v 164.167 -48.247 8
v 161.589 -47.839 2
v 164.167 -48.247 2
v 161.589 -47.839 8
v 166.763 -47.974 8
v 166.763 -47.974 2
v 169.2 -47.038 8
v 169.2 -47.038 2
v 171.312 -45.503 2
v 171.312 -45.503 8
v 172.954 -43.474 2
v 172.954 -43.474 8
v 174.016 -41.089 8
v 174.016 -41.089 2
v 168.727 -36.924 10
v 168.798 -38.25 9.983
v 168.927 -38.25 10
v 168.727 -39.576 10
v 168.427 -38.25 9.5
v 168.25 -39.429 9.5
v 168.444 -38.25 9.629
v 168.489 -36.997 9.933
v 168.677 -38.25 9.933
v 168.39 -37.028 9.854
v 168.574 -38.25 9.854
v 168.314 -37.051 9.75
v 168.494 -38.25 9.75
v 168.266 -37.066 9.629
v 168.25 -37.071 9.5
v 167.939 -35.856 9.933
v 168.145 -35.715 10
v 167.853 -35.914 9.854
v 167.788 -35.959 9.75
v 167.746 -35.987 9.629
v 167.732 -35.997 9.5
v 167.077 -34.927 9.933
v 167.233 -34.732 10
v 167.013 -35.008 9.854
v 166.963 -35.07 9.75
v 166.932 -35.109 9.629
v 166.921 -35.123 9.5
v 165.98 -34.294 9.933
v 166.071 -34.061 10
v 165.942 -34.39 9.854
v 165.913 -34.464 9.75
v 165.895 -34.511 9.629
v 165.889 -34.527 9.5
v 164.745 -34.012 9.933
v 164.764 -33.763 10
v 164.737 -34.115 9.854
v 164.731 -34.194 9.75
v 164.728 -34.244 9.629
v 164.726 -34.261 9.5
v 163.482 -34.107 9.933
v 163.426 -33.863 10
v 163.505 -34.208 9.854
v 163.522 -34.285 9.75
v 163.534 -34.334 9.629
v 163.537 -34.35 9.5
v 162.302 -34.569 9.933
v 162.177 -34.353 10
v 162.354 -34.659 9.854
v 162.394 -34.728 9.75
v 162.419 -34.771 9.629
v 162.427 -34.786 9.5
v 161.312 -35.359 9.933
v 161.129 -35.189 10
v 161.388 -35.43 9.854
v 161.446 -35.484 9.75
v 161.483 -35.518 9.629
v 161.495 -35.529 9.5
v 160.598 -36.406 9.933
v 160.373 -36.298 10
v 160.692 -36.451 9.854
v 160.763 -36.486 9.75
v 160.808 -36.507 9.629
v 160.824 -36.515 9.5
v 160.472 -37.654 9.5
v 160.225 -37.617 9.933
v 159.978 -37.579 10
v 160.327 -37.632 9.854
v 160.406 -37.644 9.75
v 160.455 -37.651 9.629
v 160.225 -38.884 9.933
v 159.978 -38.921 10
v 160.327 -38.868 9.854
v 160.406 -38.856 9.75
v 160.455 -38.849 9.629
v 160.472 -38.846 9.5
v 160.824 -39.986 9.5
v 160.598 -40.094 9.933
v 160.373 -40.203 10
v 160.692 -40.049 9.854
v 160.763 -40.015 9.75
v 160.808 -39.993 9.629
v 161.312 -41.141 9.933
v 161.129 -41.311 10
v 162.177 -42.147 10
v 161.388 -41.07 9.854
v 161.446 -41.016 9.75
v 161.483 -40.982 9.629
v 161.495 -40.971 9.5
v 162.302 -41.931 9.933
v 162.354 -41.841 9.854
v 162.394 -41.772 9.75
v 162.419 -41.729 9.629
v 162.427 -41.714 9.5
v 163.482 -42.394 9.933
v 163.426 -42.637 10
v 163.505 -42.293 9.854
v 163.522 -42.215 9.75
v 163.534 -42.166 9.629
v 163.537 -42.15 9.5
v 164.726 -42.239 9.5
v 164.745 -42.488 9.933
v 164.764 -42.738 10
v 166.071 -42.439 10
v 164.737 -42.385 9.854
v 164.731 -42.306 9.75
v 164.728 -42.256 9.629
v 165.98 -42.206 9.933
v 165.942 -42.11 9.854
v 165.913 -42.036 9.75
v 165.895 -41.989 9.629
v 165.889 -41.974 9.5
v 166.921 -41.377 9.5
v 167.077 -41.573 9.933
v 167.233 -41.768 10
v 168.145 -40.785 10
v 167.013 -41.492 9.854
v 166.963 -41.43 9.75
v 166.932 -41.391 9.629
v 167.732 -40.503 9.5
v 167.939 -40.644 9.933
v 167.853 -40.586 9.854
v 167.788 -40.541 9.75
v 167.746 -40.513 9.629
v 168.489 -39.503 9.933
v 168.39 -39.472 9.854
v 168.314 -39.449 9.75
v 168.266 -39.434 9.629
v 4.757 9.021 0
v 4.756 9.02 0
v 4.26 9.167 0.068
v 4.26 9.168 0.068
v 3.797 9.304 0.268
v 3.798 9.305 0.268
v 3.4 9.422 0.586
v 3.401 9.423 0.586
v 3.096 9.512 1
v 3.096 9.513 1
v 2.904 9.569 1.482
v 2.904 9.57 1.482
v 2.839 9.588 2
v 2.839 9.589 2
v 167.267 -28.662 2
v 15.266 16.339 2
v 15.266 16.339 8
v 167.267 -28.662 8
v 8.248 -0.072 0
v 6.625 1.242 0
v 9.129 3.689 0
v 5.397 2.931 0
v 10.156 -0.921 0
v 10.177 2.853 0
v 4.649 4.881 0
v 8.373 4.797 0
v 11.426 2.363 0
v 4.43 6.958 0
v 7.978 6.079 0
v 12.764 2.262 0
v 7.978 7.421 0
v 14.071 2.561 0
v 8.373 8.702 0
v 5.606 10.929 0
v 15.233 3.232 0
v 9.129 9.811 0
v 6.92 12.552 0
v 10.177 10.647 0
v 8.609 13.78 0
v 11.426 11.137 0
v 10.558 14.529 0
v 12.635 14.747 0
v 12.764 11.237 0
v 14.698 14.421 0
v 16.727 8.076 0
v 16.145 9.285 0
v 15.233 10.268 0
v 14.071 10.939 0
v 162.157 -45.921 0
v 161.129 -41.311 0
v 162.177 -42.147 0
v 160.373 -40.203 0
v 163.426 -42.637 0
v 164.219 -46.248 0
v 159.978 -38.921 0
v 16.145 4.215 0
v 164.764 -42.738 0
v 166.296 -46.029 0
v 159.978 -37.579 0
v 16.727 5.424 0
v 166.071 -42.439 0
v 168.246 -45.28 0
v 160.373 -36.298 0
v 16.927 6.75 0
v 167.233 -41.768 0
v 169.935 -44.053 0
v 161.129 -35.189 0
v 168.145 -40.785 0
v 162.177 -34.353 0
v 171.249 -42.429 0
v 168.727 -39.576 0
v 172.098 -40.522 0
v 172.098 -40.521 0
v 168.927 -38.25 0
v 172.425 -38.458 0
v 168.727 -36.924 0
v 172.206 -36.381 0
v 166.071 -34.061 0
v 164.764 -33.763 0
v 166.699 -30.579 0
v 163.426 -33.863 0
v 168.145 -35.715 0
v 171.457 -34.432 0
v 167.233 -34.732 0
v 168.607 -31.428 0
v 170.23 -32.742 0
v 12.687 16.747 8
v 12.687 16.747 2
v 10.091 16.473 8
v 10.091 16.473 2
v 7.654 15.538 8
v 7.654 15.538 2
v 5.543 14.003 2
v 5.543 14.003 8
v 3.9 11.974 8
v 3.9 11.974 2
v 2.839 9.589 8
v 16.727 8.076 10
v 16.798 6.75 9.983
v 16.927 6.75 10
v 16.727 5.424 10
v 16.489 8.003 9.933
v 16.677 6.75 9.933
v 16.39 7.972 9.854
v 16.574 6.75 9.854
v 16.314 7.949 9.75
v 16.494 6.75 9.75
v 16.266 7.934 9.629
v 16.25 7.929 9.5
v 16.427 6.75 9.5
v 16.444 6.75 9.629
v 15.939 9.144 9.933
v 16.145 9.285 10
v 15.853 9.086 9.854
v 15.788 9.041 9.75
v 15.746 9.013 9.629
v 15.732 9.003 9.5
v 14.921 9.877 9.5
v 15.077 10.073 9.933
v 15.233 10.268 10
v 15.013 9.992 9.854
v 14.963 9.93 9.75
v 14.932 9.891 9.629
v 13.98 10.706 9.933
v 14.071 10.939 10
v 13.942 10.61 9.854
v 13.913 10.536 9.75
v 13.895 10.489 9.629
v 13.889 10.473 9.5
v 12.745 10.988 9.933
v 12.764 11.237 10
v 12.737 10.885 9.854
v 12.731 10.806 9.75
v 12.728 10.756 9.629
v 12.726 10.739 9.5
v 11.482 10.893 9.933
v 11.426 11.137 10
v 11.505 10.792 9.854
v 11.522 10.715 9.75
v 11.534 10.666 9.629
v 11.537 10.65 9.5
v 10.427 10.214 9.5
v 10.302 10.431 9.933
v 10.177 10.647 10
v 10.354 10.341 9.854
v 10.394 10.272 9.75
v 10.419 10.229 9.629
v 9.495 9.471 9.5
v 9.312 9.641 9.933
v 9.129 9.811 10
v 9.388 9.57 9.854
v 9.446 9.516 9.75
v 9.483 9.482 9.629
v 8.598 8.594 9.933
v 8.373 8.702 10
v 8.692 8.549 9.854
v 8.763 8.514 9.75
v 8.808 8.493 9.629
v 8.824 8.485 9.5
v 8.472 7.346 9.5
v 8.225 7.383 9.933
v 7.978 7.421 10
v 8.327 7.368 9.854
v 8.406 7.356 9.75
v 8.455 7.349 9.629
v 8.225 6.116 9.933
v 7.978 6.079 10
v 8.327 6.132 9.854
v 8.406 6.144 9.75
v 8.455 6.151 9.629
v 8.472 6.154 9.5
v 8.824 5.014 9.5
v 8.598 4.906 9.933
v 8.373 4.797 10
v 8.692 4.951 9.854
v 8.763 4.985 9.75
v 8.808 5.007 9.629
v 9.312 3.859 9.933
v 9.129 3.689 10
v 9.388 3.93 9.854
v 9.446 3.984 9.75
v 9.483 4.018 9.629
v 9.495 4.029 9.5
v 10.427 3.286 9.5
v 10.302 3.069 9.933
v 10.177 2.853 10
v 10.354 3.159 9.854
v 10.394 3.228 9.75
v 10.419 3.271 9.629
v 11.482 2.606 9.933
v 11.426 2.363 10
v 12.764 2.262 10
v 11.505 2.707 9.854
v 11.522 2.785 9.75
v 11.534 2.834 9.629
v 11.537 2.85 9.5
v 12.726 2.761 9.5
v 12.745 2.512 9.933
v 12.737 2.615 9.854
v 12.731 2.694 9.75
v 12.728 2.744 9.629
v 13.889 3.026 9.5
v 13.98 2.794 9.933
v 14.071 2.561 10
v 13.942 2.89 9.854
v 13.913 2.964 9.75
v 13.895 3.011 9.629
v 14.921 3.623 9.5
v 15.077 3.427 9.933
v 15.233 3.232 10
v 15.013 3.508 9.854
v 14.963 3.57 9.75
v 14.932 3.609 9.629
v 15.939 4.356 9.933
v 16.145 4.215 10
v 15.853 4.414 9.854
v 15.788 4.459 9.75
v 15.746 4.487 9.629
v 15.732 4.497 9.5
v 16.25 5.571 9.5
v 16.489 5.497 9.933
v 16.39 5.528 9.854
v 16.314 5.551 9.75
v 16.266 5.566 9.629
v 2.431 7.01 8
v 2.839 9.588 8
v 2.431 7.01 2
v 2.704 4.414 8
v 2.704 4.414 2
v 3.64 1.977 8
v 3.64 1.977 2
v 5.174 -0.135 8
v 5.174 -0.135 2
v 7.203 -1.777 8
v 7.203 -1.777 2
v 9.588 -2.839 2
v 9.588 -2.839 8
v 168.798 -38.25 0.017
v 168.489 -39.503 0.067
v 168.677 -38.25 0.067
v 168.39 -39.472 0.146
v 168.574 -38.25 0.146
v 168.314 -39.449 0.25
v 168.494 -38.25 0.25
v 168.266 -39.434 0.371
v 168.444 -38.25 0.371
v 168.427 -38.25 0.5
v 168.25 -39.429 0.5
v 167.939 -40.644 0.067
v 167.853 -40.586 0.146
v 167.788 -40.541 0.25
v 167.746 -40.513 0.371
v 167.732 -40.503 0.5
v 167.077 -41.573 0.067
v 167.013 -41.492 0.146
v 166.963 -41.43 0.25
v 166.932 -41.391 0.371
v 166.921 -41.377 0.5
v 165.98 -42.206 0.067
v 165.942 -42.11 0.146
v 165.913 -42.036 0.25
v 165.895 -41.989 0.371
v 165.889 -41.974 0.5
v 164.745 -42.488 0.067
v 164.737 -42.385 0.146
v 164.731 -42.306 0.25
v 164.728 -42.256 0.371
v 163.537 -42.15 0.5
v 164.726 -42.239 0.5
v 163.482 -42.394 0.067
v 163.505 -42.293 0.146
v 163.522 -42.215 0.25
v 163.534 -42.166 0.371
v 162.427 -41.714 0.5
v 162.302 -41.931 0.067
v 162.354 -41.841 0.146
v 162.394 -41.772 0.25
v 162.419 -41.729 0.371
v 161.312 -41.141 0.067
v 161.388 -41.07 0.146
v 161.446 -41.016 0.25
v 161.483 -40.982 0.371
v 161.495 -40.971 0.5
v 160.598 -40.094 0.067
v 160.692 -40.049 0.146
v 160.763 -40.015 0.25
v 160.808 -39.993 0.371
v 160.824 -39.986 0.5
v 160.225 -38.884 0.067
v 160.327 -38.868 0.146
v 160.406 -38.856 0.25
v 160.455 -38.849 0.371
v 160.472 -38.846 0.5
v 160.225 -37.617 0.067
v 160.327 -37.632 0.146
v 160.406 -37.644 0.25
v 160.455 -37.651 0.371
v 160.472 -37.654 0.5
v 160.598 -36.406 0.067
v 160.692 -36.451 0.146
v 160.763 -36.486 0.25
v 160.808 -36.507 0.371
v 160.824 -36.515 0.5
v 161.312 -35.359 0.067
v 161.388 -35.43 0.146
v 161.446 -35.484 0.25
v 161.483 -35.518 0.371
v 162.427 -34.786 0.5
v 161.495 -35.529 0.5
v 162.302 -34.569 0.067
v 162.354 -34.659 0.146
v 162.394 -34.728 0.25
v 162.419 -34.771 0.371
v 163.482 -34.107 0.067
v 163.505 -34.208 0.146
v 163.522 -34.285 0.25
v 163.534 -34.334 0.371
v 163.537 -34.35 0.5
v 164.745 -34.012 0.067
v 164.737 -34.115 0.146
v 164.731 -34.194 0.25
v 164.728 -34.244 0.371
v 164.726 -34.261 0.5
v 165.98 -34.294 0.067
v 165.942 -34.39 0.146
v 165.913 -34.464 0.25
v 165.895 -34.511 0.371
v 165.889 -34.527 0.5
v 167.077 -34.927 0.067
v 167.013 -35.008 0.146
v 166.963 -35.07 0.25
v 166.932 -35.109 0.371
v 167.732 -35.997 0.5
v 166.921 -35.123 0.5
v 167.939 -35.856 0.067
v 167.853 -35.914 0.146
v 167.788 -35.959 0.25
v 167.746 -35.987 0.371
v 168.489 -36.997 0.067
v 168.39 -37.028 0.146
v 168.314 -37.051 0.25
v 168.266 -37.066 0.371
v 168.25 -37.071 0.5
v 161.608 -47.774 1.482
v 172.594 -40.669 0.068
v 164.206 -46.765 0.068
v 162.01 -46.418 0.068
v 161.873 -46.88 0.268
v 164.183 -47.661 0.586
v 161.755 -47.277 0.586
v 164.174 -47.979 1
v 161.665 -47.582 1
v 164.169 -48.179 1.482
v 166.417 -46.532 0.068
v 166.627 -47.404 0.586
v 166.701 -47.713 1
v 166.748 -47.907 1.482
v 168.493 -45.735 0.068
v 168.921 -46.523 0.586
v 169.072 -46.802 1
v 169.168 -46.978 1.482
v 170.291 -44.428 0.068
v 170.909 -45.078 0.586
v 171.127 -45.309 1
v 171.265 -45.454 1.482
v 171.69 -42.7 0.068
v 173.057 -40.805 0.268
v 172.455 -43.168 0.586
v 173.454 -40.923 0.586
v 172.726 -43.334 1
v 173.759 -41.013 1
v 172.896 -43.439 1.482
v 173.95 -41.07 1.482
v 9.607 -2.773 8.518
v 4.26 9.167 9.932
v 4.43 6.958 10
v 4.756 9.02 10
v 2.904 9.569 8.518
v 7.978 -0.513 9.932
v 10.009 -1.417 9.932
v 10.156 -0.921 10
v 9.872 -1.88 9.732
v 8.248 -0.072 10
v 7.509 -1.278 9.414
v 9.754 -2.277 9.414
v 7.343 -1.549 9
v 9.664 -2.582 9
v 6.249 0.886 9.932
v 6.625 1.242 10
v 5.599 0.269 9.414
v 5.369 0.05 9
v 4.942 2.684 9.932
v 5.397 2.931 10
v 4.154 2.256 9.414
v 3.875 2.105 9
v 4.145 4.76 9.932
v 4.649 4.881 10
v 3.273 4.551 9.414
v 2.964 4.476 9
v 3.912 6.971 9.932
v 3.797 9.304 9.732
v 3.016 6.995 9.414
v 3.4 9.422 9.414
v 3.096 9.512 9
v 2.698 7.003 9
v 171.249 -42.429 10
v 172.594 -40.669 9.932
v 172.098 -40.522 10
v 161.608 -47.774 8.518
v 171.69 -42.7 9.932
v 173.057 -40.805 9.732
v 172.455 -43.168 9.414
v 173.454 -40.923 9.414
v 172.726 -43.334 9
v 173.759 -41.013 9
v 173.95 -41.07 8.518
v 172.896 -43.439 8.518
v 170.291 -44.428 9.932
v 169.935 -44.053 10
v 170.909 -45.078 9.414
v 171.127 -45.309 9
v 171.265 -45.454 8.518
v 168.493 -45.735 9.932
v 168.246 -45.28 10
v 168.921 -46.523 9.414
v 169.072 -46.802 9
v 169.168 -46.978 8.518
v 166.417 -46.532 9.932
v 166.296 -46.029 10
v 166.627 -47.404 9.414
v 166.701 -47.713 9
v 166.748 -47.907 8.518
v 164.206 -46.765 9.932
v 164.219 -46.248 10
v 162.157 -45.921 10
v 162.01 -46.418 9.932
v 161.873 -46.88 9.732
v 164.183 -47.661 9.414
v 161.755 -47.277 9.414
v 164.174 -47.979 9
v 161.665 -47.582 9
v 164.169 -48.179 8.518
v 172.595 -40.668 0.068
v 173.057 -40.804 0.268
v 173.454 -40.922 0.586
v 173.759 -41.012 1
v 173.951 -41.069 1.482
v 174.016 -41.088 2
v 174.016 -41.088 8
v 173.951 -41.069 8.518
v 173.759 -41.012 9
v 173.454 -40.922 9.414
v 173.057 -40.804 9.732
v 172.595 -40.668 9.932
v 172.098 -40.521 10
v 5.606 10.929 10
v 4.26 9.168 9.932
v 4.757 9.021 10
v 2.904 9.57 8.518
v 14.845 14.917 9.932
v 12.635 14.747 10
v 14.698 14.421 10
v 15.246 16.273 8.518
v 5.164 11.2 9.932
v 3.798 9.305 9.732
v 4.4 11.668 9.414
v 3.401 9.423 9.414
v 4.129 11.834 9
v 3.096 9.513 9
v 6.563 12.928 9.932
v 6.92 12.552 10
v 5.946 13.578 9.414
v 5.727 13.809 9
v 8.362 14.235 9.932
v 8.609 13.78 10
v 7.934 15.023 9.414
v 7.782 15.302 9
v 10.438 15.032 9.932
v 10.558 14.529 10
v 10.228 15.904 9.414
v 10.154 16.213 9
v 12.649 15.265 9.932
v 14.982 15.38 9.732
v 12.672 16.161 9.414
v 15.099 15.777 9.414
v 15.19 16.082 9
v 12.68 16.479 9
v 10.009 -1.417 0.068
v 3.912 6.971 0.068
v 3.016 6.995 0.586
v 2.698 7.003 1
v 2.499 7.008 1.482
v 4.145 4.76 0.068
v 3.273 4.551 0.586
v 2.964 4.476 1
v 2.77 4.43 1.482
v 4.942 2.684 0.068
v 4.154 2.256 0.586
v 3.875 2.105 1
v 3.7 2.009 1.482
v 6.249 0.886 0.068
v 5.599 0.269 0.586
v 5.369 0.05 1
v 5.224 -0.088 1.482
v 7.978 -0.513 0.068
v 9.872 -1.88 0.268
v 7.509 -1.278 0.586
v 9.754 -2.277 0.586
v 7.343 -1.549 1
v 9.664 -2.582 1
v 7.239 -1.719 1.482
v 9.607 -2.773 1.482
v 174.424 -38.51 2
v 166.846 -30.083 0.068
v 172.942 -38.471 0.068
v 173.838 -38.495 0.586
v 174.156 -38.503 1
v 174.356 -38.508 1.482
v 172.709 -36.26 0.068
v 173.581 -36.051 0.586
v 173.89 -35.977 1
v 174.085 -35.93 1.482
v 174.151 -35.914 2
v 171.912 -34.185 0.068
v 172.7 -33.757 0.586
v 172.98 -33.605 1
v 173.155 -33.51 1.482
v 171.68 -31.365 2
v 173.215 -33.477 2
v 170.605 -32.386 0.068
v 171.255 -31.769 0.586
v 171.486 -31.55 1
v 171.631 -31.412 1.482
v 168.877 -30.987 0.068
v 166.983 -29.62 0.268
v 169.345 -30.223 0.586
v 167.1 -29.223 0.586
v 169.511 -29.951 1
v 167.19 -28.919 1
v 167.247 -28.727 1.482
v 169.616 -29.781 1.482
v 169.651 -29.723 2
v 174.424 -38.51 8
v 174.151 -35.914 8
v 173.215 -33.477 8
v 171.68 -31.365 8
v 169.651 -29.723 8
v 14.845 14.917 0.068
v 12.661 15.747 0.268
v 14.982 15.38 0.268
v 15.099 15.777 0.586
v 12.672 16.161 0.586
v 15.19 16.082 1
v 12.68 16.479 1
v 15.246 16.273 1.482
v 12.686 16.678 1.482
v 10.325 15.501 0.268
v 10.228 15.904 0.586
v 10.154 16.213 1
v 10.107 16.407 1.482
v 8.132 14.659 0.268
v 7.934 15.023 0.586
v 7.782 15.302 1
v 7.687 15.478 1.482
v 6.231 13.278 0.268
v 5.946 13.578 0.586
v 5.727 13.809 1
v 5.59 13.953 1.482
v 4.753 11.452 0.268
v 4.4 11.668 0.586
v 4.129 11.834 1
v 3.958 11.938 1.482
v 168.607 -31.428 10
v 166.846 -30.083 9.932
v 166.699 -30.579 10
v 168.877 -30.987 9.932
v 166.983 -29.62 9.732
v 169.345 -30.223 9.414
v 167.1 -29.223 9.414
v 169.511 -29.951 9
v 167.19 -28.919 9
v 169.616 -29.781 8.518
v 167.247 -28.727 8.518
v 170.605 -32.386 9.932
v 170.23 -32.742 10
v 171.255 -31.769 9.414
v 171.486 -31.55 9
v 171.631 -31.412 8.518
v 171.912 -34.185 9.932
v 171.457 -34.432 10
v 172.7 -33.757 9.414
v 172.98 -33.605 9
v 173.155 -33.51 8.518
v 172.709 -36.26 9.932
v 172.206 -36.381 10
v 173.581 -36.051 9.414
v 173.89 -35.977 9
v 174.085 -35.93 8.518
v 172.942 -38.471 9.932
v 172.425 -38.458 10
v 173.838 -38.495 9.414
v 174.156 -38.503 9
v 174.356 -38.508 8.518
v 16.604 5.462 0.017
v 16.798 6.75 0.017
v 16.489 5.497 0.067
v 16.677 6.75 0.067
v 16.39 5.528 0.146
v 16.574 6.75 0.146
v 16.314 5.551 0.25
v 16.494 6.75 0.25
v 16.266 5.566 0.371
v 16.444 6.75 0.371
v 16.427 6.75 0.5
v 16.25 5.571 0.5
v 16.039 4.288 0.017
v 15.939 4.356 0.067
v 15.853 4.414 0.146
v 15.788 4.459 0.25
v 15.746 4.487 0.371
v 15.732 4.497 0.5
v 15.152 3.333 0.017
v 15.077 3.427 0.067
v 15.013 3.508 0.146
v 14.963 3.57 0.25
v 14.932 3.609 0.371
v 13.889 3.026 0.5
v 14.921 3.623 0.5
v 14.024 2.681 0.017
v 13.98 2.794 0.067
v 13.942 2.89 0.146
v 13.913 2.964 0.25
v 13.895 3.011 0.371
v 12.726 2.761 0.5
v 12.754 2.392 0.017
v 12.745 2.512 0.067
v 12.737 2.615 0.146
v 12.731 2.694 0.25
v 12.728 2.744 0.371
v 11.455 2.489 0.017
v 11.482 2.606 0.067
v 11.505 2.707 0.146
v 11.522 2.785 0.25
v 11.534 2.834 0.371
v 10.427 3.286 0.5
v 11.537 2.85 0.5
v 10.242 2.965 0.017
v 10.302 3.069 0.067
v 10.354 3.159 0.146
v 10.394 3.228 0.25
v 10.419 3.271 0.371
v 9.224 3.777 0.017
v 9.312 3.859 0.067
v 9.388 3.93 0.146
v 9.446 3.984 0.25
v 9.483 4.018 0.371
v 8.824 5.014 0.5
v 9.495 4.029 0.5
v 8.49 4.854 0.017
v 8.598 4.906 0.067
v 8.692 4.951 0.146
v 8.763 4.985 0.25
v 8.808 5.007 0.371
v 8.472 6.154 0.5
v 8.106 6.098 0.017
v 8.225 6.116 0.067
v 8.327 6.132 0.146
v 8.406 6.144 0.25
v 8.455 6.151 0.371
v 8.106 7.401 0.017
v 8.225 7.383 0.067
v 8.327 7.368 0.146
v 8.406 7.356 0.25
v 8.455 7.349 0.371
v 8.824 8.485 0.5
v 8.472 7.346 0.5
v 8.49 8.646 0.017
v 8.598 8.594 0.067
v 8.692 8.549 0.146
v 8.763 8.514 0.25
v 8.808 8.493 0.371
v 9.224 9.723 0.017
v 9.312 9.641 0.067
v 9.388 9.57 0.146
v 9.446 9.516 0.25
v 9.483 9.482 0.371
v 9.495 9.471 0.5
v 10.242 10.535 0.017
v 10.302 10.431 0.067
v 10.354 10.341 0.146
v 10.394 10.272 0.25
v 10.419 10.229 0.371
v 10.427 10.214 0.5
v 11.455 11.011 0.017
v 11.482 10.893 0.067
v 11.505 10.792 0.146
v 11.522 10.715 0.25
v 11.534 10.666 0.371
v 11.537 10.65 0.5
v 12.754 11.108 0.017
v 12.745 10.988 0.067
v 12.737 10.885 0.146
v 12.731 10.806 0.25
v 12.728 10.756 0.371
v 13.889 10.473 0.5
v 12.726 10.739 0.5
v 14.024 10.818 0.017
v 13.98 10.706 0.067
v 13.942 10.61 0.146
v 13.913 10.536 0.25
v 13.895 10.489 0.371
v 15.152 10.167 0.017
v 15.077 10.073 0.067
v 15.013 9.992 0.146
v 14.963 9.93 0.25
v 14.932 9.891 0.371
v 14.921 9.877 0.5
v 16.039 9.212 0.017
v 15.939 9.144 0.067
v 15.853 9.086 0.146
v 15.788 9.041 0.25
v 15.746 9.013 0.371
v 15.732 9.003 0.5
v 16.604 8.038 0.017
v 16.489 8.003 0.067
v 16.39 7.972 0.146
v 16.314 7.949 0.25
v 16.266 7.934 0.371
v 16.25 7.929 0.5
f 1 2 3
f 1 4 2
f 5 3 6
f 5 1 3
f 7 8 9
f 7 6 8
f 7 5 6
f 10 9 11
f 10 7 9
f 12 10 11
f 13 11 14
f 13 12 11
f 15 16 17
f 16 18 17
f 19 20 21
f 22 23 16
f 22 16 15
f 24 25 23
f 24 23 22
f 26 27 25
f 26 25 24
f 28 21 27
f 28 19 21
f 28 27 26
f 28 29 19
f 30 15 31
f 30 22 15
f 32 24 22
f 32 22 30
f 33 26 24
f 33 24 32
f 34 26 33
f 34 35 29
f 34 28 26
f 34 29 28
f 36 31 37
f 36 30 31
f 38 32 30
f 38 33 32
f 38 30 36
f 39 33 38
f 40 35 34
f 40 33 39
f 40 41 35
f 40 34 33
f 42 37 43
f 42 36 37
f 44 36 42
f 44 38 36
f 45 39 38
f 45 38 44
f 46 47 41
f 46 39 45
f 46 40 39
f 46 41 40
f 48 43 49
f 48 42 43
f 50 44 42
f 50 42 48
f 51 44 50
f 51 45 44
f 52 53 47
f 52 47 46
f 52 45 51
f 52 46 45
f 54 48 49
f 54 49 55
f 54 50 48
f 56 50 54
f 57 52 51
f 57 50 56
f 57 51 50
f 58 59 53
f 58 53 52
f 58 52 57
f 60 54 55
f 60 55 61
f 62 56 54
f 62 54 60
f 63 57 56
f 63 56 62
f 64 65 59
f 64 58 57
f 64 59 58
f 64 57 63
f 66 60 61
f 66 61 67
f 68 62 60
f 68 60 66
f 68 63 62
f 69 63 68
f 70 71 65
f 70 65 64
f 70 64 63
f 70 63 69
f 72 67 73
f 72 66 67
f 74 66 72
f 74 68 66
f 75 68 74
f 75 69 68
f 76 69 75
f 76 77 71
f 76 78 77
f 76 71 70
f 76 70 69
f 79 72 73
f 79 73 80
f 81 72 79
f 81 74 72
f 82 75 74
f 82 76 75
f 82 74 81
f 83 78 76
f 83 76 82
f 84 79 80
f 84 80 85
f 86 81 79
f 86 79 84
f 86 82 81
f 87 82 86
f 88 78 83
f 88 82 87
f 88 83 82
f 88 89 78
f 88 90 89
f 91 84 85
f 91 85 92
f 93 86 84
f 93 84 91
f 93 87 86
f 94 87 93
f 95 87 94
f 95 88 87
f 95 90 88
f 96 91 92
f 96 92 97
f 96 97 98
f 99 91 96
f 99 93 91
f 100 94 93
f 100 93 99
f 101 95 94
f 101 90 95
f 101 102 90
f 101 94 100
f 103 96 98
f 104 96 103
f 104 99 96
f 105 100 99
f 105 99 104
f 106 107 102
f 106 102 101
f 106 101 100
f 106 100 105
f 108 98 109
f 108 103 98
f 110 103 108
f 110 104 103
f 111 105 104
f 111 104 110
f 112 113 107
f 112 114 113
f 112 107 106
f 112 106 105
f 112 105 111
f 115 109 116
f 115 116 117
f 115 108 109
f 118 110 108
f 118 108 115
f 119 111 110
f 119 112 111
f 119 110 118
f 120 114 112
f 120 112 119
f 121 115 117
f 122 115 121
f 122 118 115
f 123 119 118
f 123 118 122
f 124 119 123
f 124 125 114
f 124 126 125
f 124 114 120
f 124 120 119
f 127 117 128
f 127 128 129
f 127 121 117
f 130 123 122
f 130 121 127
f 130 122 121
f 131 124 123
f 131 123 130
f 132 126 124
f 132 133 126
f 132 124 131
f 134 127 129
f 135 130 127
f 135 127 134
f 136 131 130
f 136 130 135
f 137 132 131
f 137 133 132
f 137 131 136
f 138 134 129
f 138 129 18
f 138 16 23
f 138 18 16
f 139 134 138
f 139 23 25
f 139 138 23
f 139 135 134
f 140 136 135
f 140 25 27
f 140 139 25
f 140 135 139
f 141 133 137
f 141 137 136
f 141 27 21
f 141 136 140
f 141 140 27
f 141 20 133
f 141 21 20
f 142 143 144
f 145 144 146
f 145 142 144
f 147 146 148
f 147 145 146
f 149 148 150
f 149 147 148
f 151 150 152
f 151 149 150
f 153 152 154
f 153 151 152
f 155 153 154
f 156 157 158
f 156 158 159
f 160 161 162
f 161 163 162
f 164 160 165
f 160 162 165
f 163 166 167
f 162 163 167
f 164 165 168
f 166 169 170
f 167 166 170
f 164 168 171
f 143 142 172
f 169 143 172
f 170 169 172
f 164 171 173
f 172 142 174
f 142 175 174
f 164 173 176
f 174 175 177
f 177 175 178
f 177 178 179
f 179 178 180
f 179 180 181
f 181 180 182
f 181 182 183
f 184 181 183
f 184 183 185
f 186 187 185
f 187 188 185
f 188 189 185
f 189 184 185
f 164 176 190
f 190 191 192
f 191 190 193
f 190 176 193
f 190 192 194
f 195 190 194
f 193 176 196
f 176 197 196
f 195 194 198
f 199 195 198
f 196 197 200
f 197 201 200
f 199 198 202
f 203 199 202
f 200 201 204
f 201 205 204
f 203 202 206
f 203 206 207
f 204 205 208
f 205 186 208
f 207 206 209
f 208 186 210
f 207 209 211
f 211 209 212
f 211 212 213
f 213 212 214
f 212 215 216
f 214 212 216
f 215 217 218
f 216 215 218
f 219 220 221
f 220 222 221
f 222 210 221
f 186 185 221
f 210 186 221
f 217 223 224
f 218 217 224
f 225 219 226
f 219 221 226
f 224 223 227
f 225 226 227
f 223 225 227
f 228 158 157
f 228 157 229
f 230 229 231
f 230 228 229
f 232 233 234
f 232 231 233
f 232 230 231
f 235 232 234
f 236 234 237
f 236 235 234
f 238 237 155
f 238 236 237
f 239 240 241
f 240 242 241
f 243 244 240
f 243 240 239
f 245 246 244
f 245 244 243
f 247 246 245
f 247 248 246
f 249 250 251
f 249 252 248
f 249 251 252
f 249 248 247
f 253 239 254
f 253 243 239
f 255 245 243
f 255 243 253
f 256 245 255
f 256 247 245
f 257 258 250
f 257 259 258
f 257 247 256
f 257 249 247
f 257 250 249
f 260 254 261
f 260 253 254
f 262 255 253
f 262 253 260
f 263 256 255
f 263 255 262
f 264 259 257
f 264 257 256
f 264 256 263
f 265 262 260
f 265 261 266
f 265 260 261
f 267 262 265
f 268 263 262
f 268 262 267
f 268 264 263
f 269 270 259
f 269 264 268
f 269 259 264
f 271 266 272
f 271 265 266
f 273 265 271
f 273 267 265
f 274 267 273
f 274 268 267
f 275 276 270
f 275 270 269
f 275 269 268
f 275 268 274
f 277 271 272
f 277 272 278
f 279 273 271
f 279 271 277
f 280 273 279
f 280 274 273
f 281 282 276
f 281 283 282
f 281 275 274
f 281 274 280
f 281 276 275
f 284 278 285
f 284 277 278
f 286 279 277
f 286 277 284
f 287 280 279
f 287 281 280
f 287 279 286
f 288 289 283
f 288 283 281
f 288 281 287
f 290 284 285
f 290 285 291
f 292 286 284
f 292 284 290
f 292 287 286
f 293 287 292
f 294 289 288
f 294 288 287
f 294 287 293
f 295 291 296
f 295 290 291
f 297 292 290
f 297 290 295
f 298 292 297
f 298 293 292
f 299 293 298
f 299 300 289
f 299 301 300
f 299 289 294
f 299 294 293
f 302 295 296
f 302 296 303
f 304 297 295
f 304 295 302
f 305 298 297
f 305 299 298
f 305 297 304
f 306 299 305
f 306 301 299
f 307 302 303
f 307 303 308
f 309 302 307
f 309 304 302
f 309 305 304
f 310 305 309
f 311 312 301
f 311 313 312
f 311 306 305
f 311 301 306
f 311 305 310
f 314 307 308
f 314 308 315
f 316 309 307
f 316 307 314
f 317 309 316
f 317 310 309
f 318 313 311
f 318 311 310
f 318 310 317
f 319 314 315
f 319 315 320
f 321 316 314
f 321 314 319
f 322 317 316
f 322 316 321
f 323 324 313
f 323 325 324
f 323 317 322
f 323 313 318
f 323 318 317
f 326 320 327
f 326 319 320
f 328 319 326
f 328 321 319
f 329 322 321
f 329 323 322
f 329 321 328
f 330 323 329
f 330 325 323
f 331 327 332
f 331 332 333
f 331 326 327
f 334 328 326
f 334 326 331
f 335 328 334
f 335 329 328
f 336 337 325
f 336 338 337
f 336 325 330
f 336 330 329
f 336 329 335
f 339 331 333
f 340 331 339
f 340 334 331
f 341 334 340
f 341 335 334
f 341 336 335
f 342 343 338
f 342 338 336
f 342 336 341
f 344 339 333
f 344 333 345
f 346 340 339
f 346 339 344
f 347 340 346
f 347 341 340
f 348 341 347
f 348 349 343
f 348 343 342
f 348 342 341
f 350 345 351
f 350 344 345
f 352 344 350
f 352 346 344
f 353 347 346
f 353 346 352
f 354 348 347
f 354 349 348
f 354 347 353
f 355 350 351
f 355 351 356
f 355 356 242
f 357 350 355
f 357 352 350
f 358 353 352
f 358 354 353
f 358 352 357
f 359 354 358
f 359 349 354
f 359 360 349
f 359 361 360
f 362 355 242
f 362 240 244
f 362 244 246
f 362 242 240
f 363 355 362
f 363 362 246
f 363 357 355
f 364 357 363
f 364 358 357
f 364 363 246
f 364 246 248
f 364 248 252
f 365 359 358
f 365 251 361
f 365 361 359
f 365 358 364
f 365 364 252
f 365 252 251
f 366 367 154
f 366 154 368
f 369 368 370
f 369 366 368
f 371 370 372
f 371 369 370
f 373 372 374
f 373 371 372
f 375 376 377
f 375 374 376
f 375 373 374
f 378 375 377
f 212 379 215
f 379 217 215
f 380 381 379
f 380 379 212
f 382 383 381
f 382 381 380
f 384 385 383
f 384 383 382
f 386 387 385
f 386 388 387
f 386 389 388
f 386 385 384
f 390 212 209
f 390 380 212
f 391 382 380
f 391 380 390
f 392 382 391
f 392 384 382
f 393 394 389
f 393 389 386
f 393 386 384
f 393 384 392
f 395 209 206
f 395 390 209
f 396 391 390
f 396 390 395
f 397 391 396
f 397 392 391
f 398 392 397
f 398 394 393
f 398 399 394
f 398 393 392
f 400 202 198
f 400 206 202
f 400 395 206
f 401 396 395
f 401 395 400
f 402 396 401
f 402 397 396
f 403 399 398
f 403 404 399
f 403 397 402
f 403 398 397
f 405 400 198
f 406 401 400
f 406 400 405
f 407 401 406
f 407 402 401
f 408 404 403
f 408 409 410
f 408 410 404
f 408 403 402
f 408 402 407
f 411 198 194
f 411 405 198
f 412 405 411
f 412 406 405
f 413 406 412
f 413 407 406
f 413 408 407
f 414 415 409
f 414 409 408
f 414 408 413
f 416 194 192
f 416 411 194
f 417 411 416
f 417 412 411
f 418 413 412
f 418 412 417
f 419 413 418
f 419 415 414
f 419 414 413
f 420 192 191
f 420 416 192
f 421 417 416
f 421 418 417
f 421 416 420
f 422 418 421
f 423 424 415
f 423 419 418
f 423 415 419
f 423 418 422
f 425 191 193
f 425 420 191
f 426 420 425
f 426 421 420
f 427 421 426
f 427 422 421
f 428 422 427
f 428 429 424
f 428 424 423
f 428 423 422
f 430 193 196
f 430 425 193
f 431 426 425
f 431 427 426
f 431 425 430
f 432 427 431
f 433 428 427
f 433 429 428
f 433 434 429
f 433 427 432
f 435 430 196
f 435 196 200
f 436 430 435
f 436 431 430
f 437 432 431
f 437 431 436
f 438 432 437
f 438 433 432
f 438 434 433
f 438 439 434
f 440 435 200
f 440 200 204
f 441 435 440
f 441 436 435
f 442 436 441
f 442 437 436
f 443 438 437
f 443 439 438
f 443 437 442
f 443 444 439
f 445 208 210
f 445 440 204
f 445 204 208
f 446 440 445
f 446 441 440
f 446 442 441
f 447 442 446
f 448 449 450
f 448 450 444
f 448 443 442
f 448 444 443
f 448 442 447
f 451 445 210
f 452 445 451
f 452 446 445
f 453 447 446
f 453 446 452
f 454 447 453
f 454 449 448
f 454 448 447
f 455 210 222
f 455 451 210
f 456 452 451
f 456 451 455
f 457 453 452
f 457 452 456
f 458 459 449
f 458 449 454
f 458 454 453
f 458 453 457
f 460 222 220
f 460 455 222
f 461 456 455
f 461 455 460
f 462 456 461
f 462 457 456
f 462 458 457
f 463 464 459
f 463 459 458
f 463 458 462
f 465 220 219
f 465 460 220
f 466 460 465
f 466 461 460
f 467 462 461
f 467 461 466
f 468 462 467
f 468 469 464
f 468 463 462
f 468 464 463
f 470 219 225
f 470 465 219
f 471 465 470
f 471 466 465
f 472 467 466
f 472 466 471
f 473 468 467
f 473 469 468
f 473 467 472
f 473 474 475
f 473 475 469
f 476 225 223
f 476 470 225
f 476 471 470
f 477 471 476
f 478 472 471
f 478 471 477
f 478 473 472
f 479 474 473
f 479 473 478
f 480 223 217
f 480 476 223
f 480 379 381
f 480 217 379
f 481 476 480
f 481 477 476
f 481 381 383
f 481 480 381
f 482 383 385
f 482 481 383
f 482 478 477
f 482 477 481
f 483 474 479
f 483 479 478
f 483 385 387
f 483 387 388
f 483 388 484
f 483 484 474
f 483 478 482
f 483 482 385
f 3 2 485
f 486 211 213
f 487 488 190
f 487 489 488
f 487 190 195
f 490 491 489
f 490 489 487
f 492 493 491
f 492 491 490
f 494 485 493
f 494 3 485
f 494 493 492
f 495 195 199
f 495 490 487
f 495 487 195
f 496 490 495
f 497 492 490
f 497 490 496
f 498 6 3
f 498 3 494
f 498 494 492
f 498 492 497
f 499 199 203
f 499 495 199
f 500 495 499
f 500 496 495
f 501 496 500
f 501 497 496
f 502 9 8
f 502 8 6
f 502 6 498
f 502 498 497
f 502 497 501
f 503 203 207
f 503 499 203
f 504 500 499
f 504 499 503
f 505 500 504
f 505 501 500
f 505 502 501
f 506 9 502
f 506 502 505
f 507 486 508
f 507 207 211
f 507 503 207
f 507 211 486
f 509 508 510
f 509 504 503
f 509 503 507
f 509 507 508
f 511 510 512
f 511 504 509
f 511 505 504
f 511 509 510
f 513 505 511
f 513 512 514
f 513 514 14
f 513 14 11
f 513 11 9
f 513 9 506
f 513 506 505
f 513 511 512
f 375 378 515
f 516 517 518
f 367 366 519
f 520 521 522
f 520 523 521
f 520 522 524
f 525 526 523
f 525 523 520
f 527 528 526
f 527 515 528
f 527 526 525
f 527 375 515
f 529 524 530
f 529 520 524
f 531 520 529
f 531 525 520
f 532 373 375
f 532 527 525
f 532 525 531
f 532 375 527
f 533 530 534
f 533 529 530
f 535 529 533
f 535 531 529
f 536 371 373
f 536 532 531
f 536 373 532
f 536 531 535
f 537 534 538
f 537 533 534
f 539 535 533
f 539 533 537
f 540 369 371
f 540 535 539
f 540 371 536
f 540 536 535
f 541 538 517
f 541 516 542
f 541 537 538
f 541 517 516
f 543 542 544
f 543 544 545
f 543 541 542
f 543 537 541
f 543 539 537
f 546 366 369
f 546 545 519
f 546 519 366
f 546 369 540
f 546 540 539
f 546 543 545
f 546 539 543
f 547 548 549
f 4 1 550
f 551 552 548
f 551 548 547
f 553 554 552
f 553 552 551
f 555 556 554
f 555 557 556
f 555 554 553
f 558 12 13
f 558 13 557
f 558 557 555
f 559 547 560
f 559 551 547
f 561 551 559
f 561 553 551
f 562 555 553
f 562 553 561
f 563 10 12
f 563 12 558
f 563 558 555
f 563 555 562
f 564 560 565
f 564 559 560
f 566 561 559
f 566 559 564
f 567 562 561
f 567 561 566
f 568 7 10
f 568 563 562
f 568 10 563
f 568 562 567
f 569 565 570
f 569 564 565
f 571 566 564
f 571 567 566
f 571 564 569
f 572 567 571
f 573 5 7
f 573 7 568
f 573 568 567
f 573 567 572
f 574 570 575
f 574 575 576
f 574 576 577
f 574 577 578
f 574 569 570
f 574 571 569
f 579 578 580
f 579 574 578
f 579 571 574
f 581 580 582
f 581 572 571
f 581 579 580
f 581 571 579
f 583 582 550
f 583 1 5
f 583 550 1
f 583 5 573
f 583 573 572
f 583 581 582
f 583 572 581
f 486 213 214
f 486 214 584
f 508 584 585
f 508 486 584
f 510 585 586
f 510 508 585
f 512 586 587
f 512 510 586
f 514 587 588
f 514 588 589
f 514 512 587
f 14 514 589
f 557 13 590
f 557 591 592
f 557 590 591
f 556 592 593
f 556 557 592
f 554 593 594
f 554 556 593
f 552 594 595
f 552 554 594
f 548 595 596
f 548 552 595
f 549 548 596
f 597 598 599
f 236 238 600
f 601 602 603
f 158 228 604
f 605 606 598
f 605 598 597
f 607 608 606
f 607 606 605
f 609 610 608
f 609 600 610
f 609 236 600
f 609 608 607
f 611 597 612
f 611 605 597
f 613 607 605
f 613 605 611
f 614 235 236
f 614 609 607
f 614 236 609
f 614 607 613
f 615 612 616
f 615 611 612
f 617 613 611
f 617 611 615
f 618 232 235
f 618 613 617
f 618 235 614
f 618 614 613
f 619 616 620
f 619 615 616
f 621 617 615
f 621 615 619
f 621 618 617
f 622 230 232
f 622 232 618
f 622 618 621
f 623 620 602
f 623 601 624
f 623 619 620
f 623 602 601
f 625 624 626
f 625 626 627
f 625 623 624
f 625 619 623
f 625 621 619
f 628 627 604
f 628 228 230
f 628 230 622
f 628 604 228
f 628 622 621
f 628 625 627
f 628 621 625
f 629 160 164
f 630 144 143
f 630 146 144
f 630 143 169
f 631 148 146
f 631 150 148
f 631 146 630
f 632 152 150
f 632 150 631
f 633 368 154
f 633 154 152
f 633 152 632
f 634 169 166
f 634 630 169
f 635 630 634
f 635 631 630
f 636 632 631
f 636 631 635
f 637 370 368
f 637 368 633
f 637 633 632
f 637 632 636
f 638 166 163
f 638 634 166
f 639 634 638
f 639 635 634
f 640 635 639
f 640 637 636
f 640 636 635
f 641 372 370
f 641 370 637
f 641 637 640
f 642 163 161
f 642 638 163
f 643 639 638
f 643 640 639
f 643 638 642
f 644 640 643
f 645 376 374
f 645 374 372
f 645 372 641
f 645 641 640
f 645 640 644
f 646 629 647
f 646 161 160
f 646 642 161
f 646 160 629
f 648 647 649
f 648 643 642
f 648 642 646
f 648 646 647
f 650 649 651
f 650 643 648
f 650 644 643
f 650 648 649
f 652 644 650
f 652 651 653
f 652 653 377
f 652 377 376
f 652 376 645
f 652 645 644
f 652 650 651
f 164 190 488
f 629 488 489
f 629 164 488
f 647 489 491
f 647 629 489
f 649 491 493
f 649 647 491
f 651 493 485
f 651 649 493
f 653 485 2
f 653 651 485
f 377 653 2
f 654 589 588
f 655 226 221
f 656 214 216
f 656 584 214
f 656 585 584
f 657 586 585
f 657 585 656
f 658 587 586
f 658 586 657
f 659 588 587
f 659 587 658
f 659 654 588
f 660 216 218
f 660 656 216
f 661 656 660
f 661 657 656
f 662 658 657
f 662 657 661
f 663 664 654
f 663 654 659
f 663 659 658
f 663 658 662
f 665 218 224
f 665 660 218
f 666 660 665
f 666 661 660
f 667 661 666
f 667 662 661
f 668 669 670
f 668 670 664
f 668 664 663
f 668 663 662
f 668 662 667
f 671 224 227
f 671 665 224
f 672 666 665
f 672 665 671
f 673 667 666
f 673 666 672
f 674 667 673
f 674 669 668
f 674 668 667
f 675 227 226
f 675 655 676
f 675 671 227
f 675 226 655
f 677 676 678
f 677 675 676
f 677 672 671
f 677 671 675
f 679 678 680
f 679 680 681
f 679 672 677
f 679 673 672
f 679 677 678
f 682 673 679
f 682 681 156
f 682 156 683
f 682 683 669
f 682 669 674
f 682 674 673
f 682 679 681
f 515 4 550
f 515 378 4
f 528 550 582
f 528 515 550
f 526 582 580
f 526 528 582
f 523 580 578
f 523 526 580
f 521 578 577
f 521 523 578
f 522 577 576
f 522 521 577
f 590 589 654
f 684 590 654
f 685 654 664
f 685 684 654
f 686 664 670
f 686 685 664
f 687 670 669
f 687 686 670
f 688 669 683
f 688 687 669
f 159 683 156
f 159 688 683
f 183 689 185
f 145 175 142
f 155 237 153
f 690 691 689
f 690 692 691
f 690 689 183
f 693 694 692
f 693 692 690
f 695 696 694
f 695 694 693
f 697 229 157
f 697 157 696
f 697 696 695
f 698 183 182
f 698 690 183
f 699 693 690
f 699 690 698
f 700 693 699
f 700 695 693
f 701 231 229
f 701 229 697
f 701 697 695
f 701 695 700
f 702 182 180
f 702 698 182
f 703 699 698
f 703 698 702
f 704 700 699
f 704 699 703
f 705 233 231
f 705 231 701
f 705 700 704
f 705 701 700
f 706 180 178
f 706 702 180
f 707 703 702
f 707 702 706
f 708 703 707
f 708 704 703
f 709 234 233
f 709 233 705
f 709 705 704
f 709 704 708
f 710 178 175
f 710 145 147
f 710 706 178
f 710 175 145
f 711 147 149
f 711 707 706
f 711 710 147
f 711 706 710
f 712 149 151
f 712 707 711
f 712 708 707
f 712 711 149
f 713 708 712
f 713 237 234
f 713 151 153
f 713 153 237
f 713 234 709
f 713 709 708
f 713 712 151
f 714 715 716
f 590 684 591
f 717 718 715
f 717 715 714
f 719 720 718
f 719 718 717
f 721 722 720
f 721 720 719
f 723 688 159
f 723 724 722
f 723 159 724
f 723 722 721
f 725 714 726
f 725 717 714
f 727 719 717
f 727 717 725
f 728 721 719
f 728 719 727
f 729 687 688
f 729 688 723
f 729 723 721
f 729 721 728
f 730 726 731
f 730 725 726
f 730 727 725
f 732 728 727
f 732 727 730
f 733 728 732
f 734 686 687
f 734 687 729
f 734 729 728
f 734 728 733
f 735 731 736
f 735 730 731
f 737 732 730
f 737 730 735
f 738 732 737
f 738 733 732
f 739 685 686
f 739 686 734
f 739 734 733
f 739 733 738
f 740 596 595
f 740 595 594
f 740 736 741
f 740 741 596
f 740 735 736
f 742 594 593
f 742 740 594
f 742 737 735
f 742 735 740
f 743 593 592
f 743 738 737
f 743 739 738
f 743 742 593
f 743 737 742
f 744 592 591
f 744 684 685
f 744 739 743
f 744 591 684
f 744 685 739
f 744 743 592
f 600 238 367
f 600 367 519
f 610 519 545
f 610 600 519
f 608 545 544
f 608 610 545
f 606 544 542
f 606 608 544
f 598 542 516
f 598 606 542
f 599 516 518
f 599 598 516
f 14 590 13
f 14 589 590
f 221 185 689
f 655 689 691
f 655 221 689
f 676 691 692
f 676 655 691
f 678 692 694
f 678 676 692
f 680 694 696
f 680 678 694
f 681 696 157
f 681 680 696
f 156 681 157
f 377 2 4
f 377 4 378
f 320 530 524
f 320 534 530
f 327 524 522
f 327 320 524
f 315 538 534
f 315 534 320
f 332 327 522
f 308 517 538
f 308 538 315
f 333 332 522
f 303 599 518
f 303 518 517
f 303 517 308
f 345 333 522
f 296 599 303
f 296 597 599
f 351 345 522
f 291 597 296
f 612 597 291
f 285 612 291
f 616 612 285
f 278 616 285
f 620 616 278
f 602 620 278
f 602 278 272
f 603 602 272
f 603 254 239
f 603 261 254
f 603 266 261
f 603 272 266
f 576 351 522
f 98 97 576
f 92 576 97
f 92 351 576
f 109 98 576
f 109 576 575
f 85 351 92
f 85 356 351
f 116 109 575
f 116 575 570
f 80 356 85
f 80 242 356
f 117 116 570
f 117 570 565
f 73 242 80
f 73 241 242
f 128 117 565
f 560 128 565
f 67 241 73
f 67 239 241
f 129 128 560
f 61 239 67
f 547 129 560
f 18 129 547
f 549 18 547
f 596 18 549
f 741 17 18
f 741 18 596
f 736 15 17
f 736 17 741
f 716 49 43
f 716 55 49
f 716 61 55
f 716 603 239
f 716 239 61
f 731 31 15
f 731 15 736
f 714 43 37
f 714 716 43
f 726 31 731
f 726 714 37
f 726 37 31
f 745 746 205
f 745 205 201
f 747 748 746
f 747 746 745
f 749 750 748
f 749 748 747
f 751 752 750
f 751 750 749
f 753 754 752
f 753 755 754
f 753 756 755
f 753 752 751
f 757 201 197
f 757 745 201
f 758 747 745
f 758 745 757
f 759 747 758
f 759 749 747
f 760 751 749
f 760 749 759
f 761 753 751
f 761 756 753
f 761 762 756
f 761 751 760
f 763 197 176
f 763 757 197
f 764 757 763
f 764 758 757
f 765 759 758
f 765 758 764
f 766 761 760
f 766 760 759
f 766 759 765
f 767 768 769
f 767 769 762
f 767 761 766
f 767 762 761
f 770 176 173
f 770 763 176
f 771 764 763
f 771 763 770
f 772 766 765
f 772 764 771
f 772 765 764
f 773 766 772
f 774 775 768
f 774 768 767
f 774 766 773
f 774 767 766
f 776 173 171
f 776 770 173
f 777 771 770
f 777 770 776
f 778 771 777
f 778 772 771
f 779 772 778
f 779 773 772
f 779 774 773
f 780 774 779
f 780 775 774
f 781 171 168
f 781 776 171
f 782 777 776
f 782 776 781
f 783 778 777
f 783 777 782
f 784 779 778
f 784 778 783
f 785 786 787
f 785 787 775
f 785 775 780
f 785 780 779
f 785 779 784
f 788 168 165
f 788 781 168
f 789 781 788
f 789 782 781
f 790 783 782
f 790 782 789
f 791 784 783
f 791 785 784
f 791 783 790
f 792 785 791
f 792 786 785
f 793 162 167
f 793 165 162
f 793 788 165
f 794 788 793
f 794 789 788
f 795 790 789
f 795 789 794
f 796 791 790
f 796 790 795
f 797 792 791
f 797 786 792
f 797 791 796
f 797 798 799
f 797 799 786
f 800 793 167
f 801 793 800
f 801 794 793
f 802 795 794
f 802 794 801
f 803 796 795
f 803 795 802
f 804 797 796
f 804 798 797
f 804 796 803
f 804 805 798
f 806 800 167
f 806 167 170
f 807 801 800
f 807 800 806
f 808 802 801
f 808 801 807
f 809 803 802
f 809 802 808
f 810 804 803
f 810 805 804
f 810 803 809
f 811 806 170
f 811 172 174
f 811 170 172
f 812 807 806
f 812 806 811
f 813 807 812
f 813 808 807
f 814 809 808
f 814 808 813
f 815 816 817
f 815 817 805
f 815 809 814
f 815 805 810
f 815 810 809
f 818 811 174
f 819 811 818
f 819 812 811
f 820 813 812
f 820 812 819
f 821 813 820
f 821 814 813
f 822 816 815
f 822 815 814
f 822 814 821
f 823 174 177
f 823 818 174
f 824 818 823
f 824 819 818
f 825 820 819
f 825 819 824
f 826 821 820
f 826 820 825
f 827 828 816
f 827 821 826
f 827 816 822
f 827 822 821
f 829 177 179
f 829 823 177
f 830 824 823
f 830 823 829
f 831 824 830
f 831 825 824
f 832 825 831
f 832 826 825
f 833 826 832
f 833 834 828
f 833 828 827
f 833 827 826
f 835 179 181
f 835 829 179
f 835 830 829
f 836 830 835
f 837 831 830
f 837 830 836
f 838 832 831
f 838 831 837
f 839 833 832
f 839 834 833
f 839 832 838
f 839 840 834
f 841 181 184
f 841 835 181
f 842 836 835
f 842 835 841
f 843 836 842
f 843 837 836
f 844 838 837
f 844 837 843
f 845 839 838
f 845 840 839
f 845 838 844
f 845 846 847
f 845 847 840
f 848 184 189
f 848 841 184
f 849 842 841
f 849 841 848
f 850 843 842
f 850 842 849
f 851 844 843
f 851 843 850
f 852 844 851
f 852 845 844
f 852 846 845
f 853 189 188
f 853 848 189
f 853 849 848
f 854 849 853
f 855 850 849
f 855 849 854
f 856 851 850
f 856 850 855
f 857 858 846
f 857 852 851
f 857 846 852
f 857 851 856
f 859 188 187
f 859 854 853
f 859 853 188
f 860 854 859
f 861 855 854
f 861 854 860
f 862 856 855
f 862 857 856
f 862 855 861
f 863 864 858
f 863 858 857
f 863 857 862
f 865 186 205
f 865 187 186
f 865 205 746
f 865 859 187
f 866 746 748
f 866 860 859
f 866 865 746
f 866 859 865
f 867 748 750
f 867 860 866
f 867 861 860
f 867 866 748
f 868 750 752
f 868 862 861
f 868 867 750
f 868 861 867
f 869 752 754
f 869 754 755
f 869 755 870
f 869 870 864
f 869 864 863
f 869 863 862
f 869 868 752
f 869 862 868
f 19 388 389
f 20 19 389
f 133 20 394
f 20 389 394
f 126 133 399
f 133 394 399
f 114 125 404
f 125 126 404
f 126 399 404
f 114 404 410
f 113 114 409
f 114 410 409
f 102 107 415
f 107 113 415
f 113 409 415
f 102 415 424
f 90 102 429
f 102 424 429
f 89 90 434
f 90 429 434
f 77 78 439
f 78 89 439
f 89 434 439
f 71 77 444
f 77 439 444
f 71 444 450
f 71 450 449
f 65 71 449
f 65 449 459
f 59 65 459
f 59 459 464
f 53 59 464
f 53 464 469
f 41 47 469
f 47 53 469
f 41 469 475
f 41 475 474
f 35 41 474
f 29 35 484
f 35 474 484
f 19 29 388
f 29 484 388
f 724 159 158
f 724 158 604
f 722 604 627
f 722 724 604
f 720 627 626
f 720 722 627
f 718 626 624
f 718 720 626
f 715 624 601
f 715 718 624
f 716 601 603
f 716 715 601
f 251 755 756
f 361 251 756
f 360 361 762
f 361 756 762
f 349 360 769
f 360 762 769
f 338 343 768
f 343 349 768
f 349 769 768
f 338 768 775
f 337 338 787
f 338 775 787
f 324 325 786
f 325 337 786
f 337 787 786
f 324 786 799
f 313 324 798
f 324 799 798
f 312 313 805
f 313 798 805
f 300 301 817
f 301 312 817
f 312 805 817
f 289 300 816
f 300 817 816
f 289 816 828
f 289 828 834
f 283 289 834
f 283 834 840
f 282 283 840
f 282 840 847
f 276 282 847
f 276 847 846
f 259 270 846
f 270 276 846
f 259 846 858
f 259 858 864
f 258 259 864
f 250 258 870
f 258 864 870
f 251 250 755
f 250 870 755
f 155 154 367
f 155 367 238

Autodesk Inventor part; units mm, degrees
ref_plane "YZ Plane" through (0, 0, 0) normal (1, 0, 0) x (0, 1, 0)
ref_plane "XZ Plane" through (0, 0, 0) normal (0, 1, 0) x (-1, 0, 0)
ref_plane "XY Plane" through (0, 0, 0) normal (0, 0, 1) x (1, 0, 0)
sketch "Sketch6" plane through (0, 0, 0) normal (0, 0, 1) x (1, 0, 0)
  line L0 (0, 0) -> (5.6775, 19.1772)
  line L1 (5.6775, 19.1772) -> (176.8547, -31.5002)
  line L2 (176.8547, -31.5002) -> (171.1772, -50.6775)
  line L3 (171.1772, -50.6775) -> (0, 0)
  circle A0 centre (12.4274, 6.7499) radius 4
  circle A1 centre (164.4274, -38.2501) radius 4
  dimension "d48" = 20
  dimension "d50" = 8
  dimension "d51" = 10
  dimension "d52" = 10
  dimension "d53" = 10
  dimension "d54" = 10
  dimension "d55" = 45
  dimension "d56" = 152
extrude "Extrusion5" add sketch "Sketch6" along normal blind 10
fillet "Fillet5" radius 10 4 edges at (5.6775, 19.1772, 5) (0, 0, 5) (176.8547, -31.5002, 5) (171.1772, -50.6775, 5)
fillet "Fillet6" radius 2 6 edges at (173.215, -33.4771, 0) (85.5886, -25.3387, 0) (91.2661, -6.1615, 0) (85.5886, -25.3387, 10) (91.2661, -6.1615, 10) (7.6544, 15.5375, 0)
fillet "Fillet7" radius 0.5 4 edges at (160.4274, -38.2501, 0) (8.4274, 6.7499, 0) (8.4274, 6.7499, 10) (160.4274, -38.2501, 10)
properties part number "Lift Arm Upper"
